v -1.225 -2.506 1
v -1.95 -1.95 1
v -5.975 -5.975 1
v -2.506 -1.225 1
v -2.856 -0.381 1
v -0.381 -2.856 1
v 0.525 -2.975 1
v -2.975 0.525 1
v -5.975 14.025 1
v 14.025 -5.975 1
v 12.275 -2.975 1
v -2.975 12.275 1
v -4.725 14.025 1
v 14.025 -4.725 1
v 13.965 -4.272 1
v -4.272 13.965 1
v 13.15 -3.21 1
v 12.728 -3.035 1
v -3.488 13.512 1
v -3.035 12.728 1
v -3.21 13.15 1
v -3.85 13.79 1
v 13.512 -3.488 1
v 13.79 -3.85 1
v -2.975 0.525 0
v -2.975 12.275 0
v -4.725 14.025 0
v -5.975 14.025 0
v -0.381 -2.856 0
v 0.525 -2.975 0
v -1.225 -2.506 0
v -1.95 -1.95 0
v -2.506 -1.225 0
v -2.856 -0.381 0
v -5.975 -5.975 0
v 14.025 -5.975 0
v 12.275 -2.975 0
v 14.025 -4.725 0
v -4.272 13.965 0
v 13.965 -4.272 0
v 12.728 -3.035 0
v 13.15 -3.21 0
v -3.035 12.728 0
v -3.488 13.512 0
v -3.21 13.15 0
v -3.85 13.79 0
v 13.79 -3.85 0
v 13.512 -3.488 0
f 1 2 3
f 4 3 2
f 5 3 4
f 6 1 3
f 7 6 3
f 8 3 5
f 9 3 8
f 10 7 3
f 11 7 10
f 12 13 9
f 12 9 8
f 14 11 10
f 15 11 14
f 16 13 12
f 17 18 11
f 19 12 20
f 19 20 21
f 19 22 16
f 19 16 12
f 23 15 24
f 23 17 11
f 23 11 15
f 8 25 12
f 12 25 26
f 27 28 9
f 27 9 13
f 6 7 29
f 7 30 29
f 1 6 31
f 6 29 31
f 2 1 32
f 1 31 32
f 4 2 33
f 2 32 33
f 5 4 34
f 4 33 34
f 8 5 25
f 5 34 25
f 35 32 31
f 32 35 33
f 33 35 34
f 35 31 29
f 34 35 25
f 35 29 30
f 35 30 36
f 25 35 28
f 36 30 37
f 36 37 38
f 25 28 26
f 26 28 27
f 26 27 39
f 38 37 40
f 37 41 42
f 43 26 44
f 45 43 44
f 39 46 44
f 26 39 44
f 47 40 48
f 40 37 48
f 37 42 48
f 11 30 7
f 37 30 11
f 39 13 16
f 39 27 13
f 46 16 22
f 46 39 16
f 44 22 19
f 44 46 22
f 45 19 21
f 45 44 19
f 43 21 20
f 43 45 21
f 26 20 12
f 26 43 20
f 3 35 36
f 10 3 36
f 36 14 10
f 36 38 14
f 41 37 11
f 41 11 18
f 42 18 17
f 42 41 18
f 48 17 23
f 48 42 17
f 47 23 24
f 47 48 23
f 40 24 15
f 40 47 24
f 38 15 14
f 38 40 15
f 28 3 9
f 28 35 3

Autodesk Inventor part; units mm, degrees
ref_plane "YZ Plane" through (0, 0, 0) normal (1, 0, 0) x (0, 1, 0)
ref_plane "Start plane" through (0, 0, 0) normal (0, 0, 1) x (1, 0, 0)
ref_plane "End plane" through (0, 0, 1) normal (0, 0, 1) x (1, 0, 0)
sketch "Sketch2" plane through (0, 0, 0) normal (0, 0, 1) x (1, 0, 0)
  line L0 (-2.9751, 0.5249) -> (-2.9751, 12.2749)
  line L1 (-5.9751, 14.0249) -> (-4.7251, 14.0249)
  line L2 (-5.9751, -5.9751) -> (-5.9751, 14.0249)
  line L3 (-5.9751, -5.9751) -> (14.0249, -5.9751)
  line L4 (14.0249, -4.7251) -> (14.0249, -5.9751)
  line L5 (0.5249, -2.9751) -> (12.2749, -2.9751)
  arc A0 (-2.9751, 0.5249) -> (0.5249, -2.9751) centre (0.5249, 0.5249) ccw
  arc A1 (-2.9751, 12.2749) -> (-4.7251, 14.0249) centre (-4.7251, 12.2749) ccw
  arc A2 (14.0249, -4.7251) -> (12.2749, -2.9751) centre (12.2749, -4.7251) ccw
  line L6 (0, 60.8698) -> (0, -10.145) construction
  line L7 (-10.145, 0) -> (60.8698, 0) construction
  point P0 (-2.9751, -2.9751)
  point P1 (-2.9751, 14.0249)
  point P2 (14.0249, -2.9751)
  dimension "d4" = 20
  dimension "d6" = 20
  dimension "d8" = 3
  dimension "d10" = 3
  dimension "d17" = 3.5
  dimension "d18" = 1.75
  dimension "d19" = 5.9751
  dimension "d20" = 5.9751
extrude "Body" add sketch "Sketch2" along normal up to surface (1 mm away) from surface at 0
sketch "Sketch3" plane through (0, 0, 0) normal (0, 0, 1) x (1, 0, 0)
  line L0 (0, 0) -> (10, 0)
ref_plane "Work Plane10" through (0, 0, 0) normal (0, -1, 0) x (1, 0, 0)
sketch "Sketch4" plane through (0, 0, 0) normal (0, -1, 0) x (1, 0, 0)
  line L0 (-2, 0) -> (12, 0)
  line L1 (-2, 1) -> (12, 1)
  dimension "d24" = 1
equation "\"d4\" = b"
equation "\"d6\" = b"
equation "\"d8\" = ParT"
equation "\"d10\" = ParT"
equation "\"d17\" = R"
equation "\"d18\" = R1"
equation "\"d19\" = ex"
equation "\"d20\" = d19"
equation "\"d11\" = G_L"
equation "\"b\" = 20"
equation "\"ParT\" = 3"
equation "\"R\" = 3.5"
equation "\"R1\" = 1.75"
equation "\"G_L\" = d24"
equation "\"G_OFFSET_START\" = 0"
equation "\"G_OFFSET_END\" = 0"
equation "\"d22\" = G_OFFSET_END + B_L"
equation "\"B_L\" = 1"
equation "\"ex\" = 5.975093"
properties part number "STN EN 10056-1 - L20x20x3-1" material "鋼、軟鋼"
